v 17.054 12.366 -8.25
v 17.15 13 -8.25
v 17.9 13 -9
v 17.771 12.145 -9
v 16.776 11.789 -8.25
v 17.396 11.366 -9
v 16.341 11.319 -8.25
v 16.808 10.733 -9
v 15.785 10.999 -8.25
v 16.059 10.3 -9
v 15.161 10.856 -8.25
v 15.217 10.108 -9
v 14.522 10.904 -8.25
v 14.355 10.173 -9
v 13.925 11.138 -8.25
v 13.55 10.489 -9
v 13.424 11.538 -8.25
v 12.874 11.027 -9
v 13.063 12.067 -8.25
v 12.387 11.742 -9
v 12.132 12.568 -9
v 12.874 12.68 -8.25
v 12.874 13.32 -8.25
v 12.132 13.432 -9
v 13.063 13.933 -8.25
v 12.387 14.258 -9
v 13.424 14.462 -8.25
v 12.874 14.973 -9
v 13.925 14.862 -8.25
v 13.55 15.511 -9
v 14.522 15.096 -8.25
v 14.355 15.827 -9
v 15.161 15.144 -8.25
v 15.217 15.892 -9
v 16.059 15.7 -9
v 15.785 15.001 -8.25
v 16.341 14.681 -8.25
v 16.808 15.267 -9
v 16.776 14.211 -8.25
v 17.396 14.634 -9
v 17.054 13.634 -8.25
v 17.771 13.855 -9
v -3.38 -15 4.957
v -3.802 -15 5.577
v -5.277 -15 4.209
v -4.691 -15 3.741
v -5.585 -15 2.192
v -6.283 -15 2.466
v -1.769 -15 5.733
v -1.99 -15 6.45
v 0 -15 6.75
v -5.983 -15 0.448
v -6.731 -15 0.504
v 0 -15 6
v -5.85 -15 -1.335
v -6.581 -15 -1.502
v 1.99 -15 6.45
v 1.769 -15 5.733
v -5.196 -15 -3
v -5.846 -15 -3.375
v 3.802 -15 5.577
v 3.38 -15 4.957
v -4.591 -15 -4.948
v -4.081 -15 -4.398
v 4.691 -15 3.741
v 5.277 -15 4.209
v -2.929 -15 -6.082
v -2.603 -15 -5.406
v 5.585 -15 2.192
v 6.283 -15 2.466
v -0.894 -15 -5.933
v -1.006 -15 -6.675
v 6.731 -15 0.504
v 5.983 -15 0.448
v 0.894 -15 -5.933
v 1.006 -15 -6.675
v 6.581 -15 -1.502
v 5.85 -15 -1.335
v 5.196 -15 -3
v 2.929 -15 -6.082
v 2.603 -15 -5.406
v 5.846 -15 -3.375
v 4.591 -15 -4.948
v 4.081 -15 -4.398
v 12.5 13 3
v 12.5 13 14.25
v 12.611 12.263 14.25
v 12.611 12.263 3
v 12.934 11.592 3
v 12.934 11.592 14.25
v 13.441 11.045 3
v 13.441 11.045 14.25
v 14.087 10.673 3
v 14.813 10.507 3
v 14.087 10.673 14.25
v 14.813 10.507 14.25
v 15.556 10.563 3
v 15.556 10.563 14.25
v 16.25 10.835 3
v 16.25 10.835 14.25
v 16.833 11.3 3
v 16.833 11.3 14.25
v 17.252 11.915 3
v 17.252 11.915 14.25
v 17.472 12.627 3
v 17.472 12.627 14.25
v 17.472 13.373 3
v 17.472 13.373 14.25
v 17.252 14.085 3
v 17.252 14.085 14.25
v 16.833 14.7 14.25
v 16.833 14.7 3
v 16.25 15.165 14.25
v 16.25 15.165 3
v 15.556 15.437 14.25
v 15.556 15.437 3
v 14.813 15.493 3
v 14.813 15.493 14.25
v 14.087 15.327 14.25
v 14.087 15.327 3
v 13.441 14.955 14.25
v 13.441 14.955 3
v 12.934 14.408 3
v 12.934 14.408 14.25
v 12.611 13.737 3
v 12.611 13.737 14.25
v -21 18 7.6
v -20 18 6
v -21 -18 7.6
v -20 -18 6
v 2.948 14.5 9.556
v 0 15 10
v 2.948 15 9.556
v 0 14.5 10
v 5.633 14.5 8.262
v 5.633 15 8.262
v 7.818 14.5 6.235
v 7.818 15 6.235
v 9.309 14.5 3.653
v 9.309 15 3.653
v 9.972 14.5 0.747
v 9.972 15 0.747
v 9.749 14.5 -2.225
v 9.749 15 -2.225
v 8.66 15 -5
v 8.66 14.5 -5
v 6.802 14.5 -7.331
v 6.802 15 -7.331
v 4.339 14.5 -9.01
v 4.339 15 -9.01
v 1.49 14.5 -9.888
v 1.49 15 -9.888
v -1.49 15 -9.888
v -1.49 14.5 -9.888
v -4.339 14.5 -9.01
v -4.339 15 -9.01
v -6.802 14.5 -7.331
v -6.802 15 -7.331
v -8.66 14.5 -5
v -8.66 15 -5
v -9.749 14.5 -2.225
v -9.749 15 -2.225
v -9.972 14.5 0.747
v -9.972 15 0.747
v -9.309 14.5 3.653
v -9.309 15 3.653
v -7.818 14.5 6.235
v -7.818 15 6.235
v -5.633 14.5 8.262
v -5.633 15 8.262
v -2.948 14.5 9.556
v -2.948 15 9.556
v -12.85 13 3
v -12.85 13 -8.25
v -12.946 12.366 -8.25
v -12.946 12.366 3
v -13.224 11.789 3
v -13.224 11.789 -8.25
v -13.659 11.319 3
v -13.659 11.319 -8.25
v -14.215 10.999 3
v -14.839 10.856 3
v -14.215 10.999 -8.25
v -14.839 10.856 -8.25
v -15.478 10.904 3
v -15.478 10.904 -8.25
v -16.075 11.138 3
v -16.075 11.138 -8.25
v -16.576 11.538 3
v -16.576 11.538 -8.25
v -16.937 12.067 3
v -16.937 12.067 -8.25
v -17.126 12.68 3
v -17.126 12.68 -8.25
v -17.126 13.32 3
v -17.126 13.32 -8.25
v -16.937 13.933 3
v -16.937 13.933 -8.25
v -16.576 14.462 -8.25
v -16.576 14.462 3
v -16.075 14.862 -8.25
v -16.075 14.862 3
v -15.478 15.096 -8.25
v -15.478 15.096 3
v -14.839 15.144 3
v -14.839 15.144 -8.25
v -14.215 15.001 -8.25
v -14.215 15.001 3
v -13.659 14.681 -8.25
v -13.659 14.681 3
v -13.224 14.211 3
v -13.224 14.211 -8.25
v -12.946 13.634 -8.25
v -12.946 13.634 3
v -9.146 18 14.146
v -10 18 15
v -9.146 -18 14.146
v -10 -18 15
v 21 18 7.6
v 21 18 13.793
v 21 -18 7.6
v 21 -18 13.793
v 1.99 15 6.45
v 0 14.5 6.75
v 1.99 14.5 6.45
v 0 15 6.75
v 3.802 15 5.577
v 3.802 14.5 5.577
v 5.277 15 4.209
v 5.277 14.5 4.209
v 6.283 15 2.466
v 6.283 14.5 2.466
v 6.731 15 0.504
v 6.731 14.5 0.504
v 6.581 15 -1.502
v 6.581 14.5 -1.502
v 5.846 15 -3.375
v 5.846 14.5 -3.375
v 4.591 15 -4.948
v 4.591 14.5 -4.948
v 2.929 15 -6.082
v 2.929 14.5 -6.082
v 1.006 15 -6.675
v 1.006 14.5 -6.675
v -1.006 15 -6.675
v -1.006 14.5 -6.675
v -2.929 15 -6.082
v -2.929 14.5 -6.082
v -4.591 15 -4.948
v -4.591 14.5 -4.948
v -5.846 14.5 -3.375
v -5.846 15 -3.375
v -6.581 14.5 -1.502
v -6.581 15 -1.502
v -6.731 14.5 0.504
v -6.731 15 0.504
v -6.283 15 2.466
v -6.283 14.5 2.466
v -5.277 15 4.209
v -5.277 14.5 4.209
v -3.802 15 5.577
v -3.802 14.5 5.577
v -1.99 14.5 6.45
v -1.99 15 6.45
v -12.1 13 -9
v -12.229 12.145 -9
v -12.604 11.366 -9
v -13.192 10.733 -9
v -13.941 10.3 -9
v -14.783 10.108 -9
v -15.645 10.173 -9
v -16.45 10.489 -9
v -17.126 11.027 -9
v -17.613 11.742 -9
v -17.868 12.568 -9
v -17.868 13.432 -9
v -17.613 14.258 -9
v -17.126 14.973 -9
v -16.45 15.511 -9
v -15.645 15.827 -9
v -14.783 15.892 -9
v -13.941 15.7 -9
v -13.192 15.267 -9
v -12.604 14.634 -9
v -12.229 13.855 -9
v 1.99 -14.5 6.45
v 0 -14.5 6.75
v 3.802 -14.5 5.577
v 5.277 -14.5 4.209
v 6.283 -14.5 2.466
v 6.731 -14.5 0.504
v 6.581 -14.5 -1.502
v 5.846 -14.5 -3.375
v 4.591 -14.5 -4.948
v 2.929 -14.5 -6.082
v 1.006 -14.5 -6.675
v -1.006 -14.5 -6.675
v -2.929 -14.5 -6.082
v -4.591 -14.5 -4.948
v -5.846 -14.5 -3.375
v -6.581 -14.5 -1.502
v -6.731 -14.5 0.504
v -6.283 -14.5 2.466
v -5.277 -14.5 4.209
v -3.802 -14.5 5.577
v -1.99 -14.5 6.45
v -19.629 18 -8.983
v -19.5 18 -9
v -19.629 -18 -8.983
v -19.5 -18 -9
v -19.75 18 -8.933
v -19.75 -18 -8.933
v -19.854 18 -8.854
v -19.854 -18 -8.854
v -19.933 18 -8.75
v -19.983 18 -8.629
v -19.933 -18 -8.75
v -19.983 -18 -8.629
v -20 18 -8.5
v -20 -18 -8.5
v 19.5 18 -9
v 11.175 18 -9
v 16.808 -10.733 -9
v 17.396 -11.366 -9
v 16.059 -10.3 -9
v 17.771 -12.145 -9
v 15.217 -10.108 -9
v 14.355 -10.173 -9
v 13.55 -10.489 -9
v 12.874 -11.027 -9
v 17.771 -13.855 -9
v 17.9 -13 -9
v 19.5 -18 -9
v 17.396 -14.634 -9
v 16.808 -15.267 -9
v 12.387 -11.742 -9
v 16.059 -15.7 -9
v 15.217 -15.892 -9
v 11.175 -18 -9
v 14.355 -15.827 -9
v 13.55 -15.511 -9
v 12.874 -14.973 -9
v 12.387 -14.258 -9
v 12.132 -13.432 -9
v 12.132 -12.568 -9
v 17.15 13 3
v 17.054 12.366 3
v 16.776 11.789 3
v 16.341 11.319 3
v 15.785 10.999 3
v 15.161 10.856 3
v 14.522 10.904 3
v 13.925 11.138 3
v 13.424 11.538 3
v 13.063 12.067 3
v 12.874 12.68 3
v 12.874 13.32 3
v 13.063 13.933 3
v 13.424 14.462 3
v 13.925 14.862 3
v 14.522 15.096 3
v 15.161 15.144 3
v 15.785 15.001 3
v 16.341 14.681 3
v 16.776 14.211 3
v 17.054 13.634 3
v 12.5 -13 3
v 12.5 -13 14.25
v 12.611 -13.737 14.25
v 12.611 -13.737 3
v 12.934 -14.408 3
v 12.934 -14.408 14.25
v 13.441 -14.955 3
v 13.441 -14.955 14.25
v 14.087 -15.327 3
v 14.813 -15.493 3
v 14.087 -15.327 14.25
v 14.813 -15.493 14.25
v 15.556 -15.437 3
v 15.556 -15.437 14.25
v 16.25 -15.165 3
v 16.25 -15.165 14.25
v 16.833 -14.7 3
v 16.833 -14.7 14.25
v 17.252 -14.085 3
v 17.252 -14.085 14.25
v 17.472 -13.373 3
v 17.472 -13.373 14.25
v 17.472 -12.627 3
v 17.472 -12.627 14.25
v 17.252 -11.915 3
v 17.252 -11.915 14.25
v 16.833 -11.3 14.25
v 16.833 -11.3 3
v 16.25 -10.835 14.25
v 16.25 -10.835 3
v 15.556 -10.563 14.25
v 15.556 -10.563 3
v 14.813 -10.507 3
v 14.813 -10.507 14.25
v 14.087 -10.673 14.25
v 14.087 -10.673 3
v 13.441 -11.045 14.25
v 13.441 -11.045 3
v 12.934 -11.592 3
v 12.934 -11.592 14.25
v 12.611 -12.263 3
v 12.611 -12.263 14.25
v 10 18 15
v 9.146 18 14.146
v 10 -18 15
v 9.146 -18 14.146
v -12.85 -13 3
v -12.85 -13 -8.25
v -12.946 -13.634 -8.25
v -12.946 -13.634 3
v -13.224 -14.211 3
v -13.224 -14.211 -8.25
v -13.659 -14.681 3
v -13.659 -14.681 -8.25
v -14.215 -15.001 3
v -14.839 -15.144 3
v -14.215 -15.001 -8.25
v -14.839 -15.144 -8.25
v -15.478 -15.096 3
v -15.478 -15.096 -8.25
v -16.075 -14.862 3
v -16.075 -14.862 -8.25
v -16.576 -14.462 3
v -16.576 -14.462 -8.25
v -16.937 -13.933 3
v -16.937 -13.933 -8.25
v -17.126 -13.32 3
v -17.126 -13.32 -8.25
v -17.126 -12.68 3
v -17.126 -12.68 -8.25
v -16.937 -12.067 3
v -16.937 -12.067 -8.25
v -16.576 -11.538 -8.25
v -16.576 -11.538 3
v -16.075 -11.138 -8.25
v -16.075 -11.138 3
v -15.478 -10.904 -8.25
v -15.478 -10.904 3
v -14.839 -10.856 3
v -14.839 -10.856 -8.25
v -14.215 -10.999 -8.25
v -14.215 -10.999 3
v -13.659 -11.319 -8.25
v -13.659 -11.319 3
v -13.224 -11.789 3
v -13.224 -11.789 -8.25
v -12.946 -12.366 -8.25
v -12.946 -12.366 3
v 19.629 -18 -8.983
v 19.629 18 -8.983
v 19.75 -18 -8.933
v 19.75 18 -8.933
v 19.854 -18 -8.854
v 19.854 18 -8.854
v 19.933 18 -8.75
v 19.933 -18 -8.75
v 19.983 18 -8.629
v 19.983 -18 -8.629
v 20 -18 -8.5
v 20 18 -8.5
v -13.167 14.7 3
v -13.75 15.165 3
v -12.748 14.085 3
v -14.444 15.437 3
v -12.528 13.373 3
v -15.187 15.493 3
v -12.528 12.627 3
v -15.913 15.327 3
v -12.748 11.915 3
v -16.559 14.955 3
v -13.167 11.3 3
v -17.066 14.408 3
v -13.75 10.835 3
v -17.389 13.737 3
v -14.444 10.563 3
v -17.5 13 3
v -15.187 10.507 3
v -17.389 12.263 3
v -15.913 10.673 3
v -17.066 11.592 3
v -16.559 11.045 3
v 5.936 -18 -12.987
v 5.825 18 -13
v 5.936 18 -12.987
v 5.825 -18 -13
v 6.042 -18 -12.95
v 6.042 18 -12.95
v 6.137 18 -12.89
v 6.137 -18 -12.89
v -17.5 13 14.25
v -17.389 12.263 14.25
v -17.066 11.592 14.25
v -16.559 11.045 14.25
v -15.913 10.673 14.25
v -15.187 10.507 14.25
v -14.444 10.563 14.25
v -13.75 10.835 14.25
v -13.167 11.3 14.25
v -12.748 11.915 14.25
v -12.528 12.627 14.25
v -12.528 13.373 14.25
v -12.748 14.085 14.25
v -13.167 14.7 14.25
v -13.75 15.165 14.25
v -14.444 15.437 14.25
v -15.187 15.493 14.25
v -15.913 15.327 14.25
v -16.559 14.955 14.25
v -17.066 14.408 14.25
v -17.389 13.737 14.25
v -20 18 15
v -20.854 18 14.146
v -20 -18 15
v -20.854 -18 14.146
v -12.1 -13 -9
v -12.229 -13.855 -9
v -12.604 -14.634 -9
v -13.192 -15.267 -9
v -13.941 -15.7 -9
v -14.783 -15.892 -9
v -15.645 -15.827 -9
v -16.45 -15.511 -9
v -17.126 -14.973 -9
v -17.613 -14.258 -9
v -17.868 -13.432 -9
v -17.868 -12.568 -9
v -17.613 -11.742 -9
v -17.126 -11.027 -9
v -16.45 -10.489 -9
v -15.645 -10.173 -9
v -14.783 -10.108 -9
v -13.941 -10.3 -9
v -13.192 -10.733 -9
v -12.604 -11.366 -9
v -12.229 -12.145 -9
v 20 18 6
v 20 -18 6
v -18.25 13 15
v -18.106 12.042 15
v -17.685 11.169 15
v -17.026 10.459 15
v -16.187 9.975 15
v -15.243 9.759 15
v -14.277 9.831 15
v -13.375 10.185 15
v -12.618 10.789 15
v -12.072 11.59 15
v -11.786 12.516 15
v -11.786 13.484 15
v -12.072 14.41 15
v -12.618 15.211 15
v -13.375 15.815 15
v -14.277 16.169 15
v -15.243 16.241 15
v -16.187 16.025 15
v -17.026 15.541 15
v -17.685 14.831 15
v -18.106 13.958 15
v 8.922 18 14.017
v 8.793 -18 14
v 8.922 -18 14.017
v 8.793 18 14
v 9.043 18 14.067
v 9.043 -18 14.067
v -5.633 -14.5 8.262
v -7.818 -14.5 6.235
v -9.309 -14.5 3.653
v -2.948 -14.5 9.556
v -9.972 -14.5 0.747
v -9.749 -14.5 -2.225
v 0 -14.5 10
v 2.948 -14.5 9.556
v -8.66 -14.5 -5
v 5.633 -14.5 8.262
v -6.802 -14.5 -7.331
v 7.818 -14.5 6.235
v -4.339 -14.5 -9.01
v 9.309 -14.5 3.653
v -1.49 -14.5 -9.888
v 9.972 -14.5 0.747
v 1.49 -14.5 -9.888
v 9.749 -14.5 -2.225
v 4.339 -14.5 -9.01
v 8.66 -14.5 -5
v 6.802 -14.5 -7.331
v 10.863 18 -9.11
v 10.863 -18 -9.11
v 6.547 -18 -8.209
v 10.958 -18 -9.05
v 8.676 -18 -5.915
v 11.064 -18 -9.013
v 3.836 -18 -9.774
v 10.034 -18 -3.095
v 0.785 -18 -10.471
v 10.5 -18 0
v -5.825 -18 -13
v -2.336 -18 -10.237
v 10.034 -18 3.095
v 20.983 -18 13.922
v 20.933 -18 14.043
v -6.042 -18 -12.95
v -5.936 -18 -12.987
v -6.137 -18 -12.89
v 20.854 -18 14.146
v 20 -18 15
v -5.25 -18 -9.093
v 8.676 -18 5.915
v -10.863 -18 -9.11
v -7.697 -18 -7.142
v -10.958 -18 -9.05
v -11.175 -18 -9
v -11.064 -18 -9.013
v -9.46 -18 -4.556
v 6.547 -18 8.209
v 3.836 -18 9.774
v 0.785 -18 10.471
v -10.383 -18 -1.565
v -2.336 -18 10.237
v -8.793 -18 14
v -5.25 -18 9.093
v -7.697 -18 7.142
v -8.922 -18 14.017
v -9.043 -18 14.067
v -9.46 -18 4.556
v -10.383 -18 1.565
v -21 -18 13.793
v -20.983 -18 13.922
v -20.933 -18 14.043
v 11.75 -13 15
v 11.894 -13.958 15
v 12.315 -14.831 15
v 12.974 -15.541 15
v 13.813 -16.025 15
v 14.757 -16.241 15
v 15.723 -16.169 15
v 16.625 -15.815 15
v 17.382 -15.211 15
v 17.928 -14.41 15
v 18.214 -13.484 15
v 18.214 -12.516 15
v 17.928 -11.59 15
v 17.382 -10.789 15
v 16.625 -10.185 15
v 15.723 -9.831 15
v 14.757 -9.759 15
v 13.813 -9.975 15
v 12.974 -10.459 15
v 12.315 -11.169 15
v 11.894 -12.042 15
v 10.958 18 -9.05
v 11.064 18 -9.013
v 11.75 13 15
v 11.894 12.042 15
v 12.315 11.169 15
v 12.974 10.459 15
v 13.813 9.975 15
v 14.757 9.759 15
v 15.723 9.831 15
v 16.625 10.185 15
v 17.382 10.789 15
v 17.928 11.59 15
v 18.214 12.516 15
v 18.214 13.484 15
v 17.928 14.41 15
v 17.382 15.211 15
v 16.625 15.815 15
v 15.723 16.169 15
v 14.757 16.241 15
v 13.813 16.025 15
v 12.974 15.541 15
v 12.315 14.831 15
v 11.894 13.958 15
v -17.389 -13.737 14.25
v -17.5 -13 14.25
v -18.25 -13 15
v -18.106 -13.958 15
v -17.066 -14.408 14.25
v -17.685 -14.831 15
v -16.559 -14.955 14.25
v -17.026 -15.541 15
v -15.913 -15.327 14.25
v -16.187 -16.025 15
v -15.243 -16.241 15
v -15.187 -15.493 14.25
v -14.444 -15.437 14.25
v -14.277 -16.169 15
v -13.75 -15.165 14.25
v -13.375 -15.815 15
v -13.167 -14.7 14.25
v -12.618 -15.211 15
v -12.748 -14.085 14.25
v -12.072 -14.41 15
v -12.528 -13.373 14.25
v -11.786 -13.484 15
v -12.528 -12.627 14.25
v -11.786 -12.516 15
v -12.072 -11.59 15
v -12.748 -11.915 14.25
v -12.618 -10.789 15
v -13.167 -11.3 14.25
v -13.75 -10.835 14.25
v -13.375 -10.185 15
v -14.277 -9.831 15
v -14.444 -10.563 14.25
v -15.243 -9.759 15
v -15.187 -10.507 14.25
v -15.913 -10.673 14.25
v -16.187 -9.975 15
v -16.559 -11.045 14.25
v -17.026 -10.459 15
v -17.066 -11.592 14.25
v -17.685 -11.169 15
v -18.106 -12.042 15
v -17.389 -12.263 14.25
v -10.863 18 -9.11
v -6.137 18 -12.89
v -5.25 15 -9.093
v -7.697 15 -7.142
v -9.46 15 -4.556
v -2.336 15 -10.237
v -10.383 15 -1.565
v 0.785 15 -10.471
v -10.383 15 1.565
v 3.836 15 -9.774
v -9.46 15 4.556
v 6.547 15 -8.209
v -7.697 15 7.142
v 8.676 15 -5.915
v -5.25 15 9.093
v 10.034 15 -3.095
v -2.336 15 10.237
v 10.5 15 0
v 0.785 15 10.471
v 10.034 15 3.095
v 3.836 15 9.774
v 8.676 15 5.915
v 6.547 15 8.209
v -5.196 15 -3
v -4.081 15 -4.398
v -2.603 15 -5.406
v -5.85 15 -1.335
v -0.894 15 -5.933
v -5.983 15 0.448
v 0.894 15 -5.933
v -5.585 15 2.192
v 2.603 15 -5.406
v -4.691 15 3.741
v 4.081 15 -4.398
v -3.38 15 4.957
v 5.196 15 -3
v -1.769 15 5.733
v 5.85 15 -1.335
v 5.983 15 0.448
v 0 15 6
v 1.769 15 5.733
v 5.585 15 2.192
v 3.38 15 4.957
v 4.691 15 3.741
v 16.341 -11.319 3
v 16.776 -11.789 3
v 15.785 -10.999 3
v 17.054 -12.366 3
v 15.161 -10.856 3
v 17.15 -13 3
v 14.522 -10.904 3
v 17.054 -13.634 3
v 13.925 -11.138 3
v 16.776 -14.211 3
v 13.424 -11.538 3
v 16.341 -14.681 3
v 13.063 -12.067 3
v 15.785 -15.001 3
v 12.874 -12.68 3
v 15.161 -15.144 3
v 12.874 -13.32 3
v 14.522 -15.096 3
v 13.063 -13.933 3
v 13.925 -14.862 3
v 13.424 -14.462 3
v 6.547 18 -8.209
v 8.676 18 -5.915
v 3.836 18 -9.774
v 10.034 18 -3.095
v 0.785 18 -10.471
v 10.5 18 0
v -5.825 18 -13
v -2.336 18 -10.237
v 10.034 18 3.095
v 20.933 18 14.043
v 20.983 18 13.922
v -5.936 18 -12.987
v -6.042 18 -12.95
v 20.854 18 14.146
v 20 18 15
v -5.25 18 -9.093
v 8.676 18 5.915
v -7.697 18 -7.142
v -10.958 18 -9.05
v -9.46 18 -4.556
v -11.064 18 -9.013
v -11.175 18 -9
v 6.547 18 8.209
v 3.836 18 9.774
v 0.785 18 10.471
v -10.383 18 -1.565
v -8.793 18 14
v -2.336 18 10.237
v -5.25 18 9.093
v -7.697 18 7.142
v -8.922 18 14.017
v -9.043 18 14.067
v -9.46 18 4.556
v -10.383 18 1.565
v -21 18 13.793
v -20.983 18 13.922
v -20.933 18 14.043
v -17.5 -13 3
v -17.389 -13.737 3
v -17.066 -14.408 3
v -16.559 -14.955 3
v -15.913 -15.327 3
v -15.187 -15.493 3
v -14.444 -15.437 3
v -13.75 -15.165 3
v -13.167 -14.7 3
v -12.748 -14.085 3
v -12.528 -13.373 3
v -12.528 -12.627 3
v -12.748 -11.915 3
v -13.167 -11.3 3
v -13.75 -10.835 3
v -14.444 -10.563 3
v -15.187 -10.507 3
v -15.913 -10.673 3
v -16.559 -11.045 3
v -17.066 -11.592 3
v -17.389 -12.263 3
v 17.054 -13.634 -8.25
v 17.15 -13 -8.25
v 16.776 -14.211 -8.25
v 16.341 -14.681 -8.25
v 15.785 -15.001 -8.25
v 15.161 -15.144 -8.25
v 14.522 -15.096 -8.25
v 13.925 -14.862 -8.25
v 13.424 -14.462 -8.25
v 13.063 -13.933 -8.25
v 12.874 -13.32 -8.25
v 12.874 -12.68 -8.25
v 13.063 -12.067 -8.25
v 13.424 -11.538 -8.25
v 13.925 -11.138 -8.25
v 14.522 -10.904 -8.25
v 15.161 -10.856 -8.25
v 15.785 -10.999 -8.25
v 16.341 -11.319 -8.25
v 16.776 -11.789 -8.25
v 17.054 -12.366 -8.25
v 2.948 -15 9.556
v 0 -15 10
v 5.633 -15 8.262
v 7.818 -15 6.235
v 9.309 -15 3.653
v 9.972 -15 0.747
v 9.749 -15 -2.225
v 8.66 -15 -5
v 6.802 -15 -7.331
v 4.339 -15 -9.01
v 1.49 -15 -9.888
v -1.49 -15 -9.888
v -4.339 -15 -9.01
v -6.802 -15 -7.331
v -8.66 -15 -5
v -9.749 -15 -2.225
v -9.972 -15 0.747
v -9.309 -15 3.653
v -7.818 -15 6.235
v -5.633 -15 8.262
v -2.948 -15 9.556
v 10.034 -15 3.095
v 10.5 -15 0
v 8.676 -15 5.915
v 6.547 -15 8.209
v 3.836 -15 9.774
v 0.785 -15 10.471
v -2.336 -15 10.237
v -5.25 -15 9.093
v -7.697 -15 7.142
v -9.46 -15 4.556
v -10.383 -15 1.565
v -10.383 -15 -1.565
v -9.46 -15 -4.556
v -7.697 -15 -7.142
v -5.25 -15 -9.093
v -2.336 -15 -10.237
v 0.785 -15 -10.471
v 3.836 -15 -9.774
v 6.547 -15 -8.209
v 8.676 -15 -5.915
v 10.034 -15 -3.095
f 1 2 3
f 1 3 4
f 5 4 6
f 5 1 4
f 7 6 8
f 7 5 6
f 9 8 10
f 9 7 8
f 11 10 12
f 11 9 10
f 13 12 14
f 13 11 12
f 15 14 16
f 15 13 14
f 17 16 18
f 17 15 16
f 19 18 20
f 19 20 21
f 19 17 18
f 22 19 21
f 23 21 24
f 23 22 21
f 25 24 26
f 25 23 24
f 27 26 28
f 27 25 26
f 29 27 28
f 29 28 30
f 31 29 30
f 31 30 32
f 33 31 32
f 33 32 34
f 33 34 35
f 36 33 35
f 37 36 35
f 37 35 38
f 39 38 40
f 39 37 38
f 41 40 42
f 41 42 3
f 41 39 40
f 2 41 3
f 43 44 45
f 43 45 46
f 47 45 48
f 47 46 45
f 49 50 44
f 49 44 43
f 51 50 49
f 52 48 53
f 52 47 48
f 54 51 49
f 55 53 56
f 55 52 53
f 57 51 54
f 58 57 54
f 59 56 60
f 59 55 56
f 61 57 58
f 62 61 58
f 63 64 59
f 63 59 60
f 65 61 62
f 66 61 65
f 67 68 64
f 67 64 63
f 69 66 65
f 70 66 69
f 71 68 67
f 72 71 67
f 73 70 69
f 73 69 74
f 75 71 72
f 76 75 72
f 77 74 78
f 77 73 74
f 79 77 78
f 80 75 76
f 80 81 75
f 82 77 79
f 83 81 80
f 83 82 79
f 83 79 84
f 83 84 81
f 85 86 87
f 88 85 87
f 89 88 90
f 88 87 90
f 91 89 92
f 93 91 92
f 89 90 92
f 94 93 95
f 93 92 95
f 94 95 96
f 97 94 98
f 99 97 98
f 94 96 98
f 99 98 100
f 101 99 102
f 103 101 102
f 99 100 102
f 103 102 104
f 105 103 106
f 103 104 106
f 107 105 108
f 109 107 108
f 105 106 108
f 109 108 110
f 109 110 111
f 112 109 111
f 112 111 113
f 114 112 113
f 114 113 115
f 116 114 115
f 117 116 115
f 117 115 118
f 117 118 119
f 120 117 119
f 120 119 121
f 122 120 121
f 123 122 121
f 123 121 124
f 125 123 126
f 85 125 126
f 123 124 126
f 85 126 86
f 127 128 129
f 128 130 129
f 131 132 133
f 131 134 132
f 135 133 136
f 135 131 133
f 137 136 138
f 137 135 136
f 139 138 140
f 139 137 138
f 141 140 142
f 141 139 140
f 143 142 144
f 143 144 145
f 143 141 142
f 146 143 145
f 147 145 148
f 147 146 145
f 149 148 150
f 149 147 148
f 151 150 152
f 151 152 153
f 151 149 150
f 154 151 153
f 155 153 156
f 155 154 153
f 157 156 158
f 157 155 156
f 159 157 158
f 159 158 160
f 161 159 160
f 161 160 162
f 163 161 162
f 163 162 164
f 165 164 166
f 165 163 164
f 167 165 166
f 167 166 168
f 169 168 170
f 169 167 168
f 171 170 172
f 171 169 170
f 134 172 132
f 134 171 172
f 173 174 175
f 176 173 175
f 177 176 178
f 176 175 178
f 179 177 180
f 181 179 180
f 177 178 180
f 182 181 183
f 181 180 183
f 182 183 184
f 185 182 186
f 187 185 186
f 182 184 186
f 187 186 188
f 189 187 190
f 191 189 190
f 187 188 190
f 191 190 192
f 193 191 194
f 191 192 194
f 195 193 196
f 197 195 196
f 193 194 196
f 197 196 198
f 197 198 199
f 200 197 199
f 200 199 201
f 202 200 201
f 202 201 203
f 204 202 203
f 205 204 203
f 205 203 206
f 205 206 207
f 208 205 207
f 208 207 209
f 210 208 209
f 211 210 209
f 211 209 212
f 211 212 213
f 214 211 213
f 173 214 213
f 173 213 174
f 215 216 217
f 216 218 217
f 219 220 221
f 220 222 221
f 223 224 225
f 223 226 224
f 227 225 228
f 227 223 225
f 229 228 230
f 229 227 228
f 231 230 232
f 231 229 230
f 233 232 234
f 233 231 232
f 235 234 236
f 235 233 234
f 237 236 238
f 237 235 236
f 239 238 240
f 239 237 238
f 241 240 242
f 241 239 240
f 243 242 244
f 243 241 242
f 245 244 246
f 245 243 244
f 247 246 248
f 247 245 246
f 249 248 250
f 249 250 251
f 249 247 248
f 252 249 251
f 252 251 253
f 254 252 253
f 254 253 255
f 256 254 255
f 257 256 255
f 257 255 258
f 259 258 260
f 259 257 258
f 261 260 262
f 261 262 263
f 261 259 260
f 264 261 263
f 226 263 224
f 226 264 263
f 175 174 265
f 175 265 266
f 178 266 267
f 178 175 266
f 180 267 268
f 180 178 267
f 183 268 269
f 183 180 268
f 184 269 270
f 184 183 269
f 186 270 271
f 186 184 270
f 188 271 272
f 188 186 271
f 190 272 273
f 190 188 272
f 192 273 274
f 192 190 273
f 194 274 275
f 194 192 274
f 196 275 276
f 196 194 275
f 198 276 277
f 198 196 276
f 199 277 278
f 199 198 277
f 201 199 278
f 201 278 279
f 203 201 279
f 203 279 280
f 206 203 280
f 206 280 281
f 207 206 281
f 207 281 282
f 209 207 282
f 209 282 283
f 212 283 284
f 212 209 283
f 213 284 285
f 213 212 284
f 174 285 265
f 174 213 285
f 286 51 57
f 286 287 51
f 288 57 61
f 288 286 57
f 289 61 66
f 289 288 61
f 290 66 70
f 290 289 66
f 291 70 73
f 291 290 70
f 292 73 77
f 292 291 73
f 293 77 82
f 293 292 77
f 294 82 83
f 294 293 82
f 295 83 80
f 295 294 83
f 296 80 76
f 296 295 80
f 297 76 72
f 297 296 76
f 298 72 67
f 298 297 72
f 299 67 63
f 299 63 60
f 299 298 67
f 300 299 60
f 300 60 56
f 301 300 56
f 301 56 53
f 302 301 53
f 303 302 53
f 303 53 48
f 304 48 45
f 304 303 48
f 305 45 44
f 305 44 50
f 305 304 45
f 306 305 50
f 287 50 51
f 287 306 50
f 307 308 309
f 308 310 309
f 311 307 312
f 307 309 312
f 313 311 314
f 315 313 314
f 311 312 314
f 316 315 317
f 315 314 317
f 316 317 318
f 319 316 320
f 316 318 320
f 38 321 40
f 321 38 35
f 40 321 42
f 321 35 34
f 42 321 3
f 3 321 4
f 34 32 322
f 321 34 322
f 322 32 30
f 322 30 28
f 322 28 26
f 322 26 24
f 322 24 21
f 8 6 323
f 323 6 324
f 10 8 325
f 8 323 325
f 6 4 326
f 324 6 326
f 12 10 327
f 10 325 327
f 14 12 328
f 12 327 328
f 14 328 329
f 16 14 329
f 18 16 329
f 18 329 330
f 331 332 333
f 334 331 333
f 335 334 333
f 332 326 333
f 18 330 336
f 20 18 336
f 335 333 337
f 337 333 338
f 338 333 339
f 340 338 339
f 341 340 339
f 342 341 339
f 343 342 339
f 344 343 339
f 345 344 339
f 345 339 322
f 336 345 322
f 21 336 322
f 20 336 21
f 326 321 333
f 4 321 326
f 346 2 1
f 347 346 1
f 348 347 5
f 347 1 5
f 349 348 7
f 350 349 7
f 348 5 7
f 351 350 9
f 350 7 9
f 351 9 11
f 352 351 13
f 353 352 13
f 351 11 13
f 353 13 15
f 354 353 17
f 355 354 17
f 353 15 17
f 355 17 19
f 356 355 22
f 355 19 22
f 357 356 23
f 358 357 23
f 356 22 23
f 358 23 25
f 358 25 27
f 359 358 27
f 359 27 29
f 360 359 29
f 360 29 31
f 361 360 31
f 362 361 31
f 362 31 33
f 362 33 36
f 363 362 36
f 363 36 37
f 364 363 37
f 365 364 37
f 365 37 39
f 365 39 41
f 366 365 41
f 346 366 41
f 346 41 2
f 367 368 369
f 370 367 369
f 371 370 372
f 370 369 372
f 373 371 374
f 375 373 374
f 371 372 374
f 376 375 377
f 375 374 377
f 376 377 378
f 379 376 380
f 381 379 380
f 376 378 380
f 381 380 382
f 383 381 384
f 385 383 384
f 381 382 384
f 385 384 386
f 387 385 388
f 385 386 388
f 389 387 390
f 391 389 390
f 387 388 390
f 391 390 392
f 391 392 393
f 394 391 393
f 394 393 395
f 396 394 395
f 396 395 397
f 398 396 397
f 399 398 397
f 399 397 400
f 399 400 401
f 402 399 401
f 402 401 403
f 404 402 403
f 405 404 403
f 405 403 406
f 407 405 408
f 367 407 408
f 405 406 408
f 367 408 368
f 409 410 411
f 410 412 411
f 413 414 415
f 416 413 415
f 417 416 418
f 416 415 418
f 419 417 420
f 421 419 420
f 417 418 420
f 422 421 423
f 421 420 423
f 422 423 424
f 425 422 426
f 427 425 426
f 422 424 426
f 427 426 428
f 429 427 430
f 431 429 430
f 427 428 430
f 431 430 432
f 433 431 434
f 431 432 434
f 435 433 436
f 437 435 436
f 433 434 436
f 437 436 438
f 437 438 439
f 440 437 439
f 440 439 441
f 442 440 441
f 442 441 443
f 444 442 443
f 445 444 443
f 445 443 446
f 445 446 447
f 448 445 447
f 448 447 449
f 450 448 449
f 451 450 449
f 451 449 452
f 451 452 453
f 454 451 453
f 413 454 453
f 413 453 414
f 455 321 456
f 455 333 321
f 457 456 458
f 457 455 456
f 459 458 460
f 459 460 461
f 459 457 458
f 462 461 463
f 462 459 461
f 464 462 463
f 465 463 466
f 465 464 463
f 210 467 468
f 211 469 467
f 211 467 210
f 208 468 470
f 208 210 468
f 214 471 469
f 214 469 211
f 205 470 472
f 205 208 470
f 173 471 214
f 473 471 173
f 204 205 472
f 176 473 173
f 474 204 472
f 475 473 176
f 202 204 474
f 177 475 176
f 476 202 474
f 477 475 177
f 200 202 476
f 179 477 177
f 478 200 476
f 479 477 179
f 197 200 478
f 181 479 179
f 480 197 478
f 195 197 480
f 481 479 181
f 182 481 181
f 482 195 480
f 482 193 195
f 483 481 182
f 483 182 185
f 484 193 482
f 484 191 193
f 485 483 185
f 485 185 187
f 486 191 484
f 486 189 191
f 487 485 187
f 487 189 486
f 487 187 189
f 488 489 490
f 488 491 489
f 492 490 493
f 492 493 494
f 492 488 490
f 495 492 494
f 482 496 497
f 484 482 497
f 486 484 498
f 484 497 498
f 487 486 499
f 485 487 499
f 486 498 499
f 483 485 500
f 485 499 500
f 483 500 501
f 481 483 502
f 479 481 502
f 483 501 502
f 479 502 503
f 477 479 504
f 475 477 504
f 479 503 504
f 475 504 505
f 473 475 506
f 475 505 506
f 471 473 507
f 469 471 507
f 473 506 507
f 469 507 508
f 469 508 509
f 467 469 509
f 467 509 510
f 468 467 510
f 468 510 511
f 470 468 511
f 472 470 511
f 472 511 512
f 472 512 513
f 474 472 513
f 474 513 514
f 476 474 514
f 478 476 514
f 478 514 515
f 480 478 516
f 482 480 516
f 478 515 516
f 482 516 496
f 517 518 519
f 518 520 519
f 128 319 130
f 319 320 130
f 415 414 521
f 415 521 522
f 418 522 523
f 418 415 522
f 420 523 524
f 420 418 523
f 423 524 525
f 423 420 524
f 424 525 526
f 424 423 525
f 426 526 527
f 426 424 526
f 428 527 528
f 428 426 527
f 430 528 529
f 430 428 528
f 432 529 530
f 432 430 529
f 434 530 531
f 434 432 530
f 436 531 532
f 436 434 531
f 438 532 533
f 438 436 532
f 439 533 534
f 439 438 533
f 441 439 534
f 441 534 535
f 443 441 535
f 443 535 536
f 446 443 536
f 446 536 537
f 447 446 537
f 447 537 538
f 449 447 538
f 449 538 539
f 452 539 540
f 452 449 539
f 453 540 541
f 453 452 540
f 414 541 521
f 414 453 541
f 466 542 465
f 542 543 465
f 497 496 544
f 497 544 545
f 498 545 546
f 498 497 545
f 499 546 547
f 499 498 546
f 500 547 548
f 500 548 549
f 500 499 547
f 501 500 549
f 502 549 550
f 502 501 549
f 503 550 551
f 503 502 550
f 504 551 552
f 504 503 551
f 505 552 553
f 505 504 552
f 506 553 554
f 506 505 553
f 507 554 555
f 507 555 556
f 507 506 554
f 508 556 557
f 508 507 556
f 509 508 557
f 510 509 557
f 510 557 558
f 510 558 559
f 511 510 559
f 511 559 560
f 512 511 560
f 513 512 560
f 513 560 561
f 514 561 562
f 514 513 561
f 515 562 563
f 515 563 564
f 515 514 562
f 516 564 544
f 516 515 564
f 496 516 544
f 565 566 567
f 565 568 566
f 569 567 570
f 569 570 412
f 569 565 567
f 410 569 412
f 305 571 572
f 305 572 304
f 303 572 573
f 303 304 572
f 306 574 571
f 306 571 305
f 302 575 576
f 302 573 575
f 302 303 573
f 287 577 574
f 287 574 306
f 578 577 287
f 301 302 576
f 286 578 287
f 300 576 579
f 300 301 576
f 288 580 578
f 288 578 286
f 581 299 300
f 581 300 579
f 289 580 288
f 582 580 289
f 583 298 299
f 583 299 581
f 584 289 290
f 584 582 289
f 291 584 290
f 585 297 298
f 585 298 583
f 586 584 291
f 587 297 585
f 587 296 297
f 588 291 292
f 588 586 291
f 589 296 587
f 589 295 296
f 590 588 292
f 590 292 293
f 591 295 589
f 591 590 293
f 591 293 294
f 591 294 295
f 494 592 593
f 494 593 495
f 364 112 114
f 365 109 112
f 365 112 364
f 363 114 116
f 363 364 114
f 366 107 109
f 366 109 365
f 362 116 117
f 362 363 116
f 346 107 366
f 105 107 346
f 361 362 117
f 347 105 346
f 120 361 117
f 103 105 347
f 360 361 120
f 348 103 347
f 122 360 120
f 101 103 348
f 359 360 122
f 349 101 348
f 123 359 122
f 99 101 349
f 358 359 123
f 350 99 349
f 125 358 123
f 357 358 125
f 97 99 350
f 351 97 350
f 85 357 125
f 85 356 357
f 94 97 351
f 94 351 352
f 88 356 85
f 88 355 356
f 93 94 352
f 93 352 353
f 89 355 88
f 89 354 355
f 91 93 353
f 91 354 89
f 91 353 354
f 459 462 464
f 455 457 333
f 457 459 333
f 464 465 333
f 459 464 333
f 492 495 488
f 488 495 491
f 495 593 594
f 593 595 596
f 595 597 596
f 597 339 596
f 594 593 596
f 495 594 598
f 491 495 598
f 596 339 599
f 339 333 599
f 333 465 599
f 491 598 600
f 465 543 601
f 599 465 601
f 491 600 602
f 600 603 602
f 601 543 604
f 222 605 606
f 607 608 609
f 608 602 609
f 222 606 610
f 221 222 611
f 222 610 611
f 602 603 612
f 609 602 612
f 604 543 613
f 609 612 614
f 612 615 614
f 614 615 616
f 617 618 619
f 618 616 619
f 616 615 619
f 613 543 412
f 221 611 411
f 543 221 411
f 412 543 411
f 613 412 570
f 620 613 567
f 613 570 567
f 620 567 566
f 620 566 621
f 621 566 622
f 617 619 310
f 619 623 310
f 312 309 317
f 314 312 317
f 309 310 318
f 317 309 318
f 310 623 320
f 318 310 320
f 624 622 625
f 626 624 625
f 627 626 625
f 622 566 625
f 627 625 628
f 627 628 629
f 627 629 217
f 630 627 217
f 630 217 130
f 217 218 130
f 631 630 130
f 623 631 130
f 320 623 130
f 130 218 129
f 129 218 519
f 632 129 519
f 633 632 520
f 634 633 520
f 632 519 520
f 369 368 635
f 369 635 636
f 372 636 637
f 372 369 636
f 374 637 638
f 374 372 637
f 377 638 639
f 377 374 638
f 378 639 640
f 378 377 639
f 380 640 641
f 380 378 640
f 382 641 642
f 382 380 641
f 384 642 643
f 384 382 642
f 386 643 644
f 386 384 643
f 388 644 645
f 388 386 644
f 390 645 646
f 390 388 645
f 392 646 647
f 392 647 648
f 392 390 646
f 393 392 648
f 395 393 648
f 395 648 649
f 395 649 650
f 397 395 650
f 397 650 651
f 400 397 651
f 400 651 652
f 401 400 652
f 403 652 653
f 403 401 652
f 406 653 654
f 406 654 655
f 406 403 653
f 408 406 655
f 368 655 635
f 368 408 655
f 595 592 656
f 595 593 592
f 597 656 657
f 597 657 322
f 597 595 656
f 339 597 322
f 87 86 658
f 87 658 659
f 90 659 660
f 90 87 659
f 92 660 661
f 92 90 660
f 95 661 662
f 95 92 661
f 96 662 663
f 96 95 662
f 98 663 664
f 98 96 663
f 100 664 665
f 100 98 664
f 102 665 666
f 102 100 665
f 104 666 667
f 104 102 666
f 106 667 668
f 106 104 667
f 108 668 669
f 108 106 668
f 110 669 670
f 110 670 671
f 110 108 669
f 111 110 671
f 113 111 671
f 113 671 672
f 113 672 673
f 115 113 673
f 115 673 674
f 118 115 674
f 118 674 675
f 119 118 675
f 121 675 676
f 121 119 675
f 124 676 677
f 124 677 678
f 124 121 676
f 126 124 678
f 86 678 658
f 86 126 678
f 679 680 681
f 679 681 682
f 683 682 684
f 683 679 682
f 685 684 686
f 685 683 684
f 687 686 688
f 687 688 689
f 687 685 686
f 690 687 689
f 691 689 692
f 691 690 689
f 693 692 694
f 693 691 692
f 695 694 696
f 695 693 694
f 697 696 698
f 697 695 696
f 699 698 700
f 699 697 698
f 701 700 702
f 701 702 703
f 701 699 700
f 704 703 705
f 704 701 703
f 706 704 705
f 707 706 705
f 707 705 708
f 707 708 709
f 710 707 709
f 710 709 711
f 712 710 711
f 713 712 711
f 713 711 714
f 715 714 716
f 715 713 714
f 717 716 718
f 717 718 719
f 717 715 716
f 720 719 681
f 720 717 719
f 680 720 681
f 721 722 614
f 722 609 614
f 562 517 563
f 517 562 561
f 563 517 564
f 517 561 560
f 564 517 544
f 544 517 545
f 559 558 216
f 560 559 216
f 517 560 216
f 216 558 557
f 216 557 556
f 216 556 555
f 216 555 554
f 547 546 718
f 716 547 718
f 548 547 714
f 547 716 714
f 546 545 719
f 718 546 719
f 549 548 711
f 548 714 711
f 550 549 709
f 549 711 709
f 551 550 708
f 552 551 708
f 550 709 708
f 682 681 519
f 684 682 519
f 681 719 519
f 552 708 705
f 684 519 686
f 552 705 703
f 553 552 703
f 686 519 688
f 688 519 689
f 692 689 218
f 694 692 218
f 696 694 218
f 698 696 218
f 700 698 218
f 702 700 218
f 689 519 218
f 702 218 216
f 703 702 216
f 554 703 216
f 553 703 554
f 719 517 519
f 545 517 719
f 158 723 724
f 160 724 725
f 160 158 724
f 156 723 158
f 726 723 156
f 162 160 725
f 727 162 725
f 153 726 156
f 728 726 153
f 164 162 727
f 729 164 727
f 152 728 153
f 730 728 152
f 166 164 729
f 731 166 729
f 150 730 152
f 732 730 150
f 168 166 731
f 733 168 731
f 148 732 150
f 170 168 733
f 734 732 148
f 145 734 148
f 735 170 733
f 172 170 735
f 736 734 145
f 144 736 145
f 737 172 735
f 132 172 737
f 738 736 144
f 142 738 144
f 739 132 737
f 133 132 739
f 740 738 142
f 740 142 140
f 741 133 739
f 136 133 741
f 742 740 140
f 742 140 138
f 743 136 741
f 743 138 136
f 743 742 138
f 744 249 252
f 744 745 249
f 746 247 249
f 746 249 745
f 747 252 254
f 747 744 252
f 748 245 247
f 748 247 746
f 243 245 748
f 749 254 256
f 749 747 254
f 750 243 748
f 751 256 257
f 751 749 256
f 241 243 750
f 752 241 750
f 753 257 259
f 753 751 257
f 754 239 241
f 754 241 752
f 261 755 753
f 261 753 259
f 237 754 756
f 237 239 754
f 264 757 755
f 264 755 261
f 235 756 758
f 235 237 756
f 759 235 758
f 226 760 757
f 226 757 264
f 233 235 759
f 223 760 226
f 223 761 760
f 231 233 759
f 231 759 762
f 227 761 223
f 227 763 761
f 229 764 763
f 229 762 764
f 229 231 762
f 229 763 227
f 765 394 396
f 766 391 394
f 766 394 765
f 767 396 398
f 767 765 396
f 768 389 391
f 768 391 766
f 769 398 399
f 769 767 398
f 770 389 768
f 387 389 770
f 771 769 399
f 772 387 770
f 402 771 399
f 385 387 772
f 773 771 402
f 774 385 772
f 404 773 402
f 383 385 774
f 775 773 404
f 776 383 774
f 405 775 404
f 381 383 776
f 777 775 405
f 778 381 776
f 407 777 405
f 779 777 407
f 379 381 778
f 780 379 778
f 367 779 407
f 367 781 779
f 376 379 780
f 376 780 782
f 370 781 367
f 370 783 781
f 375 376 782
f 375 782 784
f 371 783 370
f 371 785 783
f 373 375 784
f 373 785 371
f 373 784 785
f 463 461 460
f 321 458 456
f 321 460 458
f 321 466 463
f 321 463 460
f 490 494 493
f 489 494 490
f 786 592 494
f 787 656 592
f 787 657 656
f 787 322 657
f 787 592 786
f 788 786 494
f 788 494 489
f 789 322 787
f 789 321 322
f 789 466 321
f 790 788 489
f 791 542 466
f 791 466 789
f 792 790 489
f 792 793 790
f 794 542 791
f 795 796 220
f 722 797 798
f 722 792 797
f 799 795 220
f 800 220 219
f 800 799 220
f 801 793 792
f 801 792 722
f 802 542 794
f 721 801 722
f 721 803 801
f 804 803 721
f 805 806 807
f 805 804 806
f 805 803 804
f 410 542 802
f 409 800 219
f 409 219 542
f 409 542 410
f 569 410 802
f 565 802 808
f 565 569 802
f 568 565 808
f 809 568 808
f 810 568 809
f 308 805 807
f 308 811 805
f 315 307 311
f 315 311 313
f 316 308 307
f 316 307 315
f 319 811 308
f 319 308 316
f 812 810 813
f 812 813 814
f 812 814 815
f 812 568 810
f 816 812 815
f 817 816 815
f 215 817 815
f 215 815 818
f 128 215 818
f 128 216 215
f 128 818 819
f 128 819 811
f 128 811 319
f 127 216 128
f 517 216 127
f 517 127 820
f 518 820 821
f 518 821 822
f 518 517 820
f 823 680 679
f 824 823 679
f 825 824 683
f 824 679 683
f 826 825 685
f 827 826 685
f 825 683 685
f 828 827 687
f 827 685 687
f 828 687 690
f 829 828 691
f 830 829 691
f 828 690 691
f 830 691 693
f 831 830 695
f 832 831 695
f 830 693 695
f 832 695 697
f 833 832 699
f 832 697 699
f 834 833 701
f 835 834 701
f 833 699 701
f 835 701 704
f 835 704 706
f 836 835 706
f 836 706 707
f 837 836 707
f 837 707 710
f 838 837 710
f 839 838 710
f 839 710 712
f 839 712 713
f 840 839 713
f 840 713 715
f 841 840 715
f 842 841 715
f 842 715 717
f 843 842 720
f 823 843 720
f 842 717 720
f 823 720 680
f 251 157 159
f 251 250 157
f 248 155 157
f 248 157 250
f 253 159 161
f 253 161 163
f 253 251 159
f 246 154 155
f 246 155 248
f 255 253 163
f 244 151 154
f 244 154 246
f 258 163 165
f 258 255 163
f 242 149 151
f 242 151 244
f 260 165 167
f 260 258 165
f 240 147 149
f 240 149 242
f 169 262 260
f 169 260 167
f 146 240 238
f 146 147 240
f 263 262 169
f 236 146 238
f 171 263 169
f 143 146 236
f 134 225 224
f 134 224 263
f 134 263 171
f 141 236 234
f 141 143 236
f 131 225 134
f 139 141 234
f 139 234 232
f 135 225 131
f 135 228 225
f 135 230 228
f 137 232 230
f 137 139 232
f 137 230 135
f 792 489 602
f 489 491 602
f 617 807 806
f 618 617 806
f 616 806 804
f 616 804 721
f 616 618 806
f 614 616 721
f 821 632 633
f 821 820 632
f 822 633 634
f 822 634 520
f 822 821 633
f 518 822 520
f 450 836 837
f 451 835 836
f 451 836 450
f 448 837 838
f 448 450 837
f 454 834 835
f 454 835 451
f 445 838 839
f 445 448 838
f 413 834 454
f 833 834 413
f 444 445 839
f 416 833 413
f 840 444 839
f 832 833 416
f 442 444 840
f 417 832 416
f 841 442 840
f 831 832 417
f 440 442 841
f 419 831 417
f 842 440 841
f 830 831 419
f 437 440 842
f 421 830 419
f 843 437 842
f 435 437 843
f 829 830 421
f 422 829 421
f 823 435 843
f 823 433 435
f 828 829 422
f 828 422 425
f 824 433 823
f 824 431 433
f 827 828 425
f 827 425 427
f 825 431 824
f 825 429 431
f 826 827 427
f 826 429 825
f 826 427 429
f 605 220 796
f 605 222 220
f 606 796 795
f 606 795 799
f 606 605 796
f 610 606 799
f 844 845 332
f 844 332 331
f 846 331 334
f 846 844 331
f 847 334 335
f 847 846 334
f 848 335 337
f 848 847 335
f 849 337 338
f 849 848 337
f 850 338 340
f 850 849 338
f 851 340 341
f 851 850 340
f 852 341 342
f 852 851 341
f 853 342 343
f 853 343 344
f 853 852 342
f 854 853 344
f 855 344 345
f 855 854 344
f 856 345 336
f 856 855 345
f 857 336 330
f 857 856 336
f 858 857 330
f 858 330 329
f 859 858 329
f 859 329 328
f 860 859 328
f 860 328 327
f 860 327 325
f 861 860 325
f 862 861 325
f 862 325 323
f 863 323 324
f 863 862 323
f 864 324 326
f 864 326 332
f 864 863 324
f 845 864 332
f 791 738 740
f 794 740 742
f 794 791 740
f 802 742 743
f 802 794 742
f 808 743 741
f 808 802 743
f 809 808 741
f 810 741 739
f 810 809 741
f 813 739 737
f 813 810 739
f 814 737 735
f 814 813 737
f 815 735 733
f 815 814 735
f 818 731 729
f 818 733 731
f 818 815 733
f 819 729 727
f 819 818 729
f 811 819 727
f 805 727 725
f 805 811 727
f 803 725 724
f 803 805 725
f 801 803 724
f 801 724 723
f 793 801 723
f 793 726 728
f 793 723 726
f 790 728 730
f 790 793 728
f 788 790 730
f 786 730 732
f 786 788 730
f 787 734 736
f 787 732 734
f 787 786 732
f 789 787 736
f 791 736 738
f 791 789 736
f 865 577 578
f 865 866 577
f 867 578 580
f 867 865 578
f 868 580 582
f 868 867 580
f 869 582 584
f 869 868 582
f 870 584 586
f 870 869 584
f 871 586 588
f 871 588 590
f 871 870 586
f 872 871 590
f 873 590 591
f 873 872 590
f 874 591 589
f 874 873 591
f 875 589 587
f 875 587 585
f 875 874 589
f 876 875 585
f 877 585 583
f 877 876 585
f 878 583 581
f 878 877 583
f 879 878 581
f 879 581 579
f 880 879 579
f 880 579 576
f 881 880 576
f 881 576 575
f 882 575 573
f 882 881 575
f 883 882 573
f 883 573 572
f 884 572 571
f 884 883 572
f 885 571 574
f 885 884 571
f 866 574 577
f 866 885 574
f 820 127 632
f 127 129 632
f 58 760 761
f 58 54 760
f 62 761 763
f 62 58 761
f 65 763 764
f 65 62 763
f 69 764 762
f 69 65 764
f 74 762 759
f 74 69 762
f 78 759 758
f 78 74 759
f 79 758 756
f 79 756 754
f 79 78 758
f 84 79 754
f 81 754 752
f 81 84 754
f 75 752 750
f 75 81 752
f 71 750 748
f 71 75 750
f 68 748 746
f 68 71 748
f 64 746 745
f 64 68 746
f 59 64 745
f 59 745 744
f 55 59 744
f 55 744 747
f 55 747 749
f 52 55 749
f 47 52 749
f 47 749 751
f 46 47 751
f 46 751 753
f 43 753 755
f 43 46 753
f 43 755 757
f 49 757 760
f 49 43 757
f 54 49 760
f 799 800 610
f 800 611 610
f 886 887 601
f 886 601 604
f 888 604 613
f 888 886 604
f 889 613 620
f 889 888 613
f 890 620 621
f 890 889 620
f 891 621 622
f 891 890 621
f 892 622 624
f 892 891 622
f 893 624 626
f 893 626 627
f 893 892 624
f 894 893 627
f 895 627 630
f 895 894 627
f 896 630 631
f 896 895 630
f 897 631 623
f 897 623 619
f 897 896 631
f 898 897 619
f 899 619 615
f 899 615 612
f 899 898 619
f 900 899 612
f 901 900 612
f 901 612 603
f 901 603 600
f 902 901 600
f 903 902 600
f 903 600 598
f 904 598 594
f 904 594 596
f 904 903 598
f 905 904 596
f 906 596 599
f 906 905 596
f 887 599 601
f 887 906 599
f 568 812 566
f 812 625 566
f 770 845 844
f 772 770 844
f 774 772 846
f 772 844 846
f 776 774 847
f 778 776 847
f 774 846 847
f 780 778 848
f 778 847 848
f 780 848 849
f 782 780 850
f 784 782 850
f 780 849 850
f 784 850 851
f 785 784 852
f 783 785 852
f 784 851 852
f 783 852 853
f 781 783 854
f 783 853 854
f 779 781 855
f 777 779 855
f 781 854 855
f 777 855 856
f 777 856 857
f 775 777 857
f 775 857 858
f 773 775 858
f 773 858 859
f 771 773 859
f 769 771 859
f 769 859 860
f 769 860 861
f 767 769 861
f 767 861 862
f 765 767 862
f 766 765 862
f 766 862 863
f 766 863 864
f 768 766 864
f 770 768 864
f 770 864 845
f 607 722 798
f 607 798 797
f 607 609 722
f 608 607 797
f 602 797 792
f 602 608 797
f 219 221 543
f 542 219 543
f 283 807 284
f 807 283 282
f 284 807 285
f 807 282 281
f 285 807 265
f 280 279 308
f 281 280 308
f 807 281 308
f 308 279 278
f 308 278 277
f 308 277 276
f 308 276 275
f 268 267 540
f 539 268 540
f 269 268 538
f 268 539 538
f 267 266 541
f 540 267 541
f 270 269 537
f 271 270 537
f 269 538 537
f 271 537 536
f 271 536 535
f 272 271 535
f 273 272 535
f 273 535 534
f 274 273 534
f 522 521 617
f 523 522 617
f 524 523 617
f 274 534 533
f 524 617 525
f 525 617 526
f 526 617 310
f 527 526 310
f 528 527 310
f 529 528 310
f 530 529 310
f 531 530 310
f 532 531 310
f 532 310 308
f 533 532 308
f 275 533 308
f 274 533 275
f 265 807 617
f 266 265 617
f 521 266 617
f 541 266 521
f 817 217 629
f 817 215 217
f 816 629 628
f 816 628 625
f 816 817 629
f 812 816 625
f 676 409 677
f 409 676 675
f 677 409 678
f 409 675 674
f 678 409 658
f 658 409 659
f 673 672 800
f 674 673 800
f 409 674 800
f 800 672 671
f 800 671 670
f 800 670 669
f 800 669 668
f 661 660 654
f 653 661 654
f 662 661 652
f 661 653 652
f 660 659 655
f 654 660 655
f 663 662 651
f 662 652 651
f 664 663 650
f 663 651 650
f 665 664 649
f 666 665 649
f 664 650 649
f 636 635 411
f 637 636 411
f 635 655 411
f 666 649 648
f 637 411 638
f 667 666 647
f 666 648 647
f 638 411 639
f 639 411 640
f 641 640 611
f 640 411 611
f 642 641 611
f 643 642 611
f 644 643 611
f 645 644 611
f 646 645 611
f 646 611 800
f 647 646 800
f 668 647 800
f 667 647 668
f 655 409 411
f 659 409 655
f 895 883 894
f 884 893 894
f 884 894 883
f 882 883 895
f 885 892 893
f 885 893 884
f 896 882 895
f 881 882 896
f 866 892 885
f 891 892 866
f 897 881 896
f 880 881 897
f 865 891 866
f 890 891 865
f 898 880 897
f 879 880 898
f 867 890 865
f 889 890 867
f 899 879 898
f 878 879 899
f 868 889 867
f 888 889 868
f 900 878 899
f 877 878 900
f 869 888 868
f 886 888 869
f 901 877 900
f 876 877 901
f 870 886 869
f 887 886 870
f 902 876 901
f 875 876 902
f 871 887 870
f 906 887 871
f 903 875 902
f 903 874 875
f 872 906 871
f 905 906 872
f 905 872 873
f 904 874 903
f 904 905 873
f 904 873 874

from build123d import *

# Parameters (mm, degrees)
SKETCH_R        = 10.5
PAD_DEPTH       = 18
SKETCH002_R     = 2.5
POCKET_DEPTH    = 12
SKETCH003_R     = 2.15
POCKET001_DEPTH = 24.001
CHAMFER_SIZE    = 0.75
CHAMFER001_SIZE = 0.75
FILLET_R        = 0.5


with BuildPart() as casing_fillet:
    # Sketch → Pad (new body, symmetric)
    with BuildSketch(Plane.XZ):
        Polygon((-20, -9), (-20, 6), (-21, 7.6), (-21, 14), (-20, 15), (-10, 15), (-9, 14), (9, 14), (10, 15), (20, 15), (21, 14), (21, 7.6), (20, 6), (20, -9), (11, -9), (6, -13), (-6, -13), (-11, -9), align=None)
        Circle(SKETCH_R, mode=Mode.SUBTRACT)
    extrude(amount=PAD_DEPTH, both=True)

    # Sketch002 → Pocket (cut)
    with BuildSketch(Plane(origin=(0, 0, 15), x_dir=(-1, 0, 0), z_dir=(0, 0, 1))):
        with Locations((-15, 13)):
            Circle(SKETCH002_R)
        with Locations((15, 13)):
            Circle(SKETCH002_R)
        with Locations((-15, -13)):
            Circle(SKETCH002_R)
        with Locations((15, -13)):
            Circle(SKETCH002_R)
    extrude(amount=-POCKET_DEPTH, mode=Mode.SUBTRACT)

    # Sketch003 → Pocket001 (cut, through all)
    with BuildSketch(Plane(origin=(0, 0, -9), x_dir=(1, 0, 0), z_dir=(0, 0, -1))):
        with Locations((-15, 13)):
            Circle(SKETCH003_R)
        with Locations((15, 13)):
            Circle(SKETCH003_R)
        with Locations((15, -13)):
            Circle(SKETCH003_R)
        with Locations((-15, -13)):
            Circle(SKETCH003_R)
    extrude(amount=-POCKET001_DEPTH, mode=Mode.SUBTRACT)

    # Chamfer
    chamfer_edges = [casing_fillet.edges().sort_by_distance(p)[0] for p in [
        (-12.5, -13, 15),
        (-12.5, 13, 15),
        (17.5, 13, 15),
        (17.5, -13, 15),
    ]]
    chamfer(chamfer_edges, length=CHAMFER_SIZE)

    # Chamfer001
    chamfer001_edges = [casing_fillet.edges().sort_by_distance(p)[0] for p in [
        (12.85, 13, -9),
        (-17.15, 13, -9),
        (-17.15, -13, -9),
        (12.85, -13, -9),
    ]]
    chamfer(chamfer001_edges, length=CHAMFER001_SIZE)

    # Fillet
    fillet_edges = [casing_fillet.edges().sort_by_distance(p)[0] for p in [
        (-9, 0, 14),
        (9, 0, 14),
        (21, 0, 14),
        (20, 0, -9),
        (6, 0, -13),
        (11, 0, -9),
        (-6, 0, -13),
        (-11, 0, -9),
        (-20, 0, -9),
        (-21, 0, 14),
    ]]
    fillet(fillet_edges, radius=FILLET_R)


with BuildPart() as sc12uu:
    # Sketch001 → Revolution (revolve)
    with BuildSketch(Plane.YZ):
        Polygon((-15, 11), (15, 11), (15, 10), (14.5, 10), (14.5, 6.75), (15, 6.75), (15, 6), (-15, 6), (-15, 6.75), (-14.5, 6.75), (-14.5, 10), (-15, 10), align=None)
    revolve(axis=Axis((0, 0, 0), (0, 1, 0)))

    # Fusion: union casing-fillet
    add(casing_fillet.part)


solid = sc12uu.part
